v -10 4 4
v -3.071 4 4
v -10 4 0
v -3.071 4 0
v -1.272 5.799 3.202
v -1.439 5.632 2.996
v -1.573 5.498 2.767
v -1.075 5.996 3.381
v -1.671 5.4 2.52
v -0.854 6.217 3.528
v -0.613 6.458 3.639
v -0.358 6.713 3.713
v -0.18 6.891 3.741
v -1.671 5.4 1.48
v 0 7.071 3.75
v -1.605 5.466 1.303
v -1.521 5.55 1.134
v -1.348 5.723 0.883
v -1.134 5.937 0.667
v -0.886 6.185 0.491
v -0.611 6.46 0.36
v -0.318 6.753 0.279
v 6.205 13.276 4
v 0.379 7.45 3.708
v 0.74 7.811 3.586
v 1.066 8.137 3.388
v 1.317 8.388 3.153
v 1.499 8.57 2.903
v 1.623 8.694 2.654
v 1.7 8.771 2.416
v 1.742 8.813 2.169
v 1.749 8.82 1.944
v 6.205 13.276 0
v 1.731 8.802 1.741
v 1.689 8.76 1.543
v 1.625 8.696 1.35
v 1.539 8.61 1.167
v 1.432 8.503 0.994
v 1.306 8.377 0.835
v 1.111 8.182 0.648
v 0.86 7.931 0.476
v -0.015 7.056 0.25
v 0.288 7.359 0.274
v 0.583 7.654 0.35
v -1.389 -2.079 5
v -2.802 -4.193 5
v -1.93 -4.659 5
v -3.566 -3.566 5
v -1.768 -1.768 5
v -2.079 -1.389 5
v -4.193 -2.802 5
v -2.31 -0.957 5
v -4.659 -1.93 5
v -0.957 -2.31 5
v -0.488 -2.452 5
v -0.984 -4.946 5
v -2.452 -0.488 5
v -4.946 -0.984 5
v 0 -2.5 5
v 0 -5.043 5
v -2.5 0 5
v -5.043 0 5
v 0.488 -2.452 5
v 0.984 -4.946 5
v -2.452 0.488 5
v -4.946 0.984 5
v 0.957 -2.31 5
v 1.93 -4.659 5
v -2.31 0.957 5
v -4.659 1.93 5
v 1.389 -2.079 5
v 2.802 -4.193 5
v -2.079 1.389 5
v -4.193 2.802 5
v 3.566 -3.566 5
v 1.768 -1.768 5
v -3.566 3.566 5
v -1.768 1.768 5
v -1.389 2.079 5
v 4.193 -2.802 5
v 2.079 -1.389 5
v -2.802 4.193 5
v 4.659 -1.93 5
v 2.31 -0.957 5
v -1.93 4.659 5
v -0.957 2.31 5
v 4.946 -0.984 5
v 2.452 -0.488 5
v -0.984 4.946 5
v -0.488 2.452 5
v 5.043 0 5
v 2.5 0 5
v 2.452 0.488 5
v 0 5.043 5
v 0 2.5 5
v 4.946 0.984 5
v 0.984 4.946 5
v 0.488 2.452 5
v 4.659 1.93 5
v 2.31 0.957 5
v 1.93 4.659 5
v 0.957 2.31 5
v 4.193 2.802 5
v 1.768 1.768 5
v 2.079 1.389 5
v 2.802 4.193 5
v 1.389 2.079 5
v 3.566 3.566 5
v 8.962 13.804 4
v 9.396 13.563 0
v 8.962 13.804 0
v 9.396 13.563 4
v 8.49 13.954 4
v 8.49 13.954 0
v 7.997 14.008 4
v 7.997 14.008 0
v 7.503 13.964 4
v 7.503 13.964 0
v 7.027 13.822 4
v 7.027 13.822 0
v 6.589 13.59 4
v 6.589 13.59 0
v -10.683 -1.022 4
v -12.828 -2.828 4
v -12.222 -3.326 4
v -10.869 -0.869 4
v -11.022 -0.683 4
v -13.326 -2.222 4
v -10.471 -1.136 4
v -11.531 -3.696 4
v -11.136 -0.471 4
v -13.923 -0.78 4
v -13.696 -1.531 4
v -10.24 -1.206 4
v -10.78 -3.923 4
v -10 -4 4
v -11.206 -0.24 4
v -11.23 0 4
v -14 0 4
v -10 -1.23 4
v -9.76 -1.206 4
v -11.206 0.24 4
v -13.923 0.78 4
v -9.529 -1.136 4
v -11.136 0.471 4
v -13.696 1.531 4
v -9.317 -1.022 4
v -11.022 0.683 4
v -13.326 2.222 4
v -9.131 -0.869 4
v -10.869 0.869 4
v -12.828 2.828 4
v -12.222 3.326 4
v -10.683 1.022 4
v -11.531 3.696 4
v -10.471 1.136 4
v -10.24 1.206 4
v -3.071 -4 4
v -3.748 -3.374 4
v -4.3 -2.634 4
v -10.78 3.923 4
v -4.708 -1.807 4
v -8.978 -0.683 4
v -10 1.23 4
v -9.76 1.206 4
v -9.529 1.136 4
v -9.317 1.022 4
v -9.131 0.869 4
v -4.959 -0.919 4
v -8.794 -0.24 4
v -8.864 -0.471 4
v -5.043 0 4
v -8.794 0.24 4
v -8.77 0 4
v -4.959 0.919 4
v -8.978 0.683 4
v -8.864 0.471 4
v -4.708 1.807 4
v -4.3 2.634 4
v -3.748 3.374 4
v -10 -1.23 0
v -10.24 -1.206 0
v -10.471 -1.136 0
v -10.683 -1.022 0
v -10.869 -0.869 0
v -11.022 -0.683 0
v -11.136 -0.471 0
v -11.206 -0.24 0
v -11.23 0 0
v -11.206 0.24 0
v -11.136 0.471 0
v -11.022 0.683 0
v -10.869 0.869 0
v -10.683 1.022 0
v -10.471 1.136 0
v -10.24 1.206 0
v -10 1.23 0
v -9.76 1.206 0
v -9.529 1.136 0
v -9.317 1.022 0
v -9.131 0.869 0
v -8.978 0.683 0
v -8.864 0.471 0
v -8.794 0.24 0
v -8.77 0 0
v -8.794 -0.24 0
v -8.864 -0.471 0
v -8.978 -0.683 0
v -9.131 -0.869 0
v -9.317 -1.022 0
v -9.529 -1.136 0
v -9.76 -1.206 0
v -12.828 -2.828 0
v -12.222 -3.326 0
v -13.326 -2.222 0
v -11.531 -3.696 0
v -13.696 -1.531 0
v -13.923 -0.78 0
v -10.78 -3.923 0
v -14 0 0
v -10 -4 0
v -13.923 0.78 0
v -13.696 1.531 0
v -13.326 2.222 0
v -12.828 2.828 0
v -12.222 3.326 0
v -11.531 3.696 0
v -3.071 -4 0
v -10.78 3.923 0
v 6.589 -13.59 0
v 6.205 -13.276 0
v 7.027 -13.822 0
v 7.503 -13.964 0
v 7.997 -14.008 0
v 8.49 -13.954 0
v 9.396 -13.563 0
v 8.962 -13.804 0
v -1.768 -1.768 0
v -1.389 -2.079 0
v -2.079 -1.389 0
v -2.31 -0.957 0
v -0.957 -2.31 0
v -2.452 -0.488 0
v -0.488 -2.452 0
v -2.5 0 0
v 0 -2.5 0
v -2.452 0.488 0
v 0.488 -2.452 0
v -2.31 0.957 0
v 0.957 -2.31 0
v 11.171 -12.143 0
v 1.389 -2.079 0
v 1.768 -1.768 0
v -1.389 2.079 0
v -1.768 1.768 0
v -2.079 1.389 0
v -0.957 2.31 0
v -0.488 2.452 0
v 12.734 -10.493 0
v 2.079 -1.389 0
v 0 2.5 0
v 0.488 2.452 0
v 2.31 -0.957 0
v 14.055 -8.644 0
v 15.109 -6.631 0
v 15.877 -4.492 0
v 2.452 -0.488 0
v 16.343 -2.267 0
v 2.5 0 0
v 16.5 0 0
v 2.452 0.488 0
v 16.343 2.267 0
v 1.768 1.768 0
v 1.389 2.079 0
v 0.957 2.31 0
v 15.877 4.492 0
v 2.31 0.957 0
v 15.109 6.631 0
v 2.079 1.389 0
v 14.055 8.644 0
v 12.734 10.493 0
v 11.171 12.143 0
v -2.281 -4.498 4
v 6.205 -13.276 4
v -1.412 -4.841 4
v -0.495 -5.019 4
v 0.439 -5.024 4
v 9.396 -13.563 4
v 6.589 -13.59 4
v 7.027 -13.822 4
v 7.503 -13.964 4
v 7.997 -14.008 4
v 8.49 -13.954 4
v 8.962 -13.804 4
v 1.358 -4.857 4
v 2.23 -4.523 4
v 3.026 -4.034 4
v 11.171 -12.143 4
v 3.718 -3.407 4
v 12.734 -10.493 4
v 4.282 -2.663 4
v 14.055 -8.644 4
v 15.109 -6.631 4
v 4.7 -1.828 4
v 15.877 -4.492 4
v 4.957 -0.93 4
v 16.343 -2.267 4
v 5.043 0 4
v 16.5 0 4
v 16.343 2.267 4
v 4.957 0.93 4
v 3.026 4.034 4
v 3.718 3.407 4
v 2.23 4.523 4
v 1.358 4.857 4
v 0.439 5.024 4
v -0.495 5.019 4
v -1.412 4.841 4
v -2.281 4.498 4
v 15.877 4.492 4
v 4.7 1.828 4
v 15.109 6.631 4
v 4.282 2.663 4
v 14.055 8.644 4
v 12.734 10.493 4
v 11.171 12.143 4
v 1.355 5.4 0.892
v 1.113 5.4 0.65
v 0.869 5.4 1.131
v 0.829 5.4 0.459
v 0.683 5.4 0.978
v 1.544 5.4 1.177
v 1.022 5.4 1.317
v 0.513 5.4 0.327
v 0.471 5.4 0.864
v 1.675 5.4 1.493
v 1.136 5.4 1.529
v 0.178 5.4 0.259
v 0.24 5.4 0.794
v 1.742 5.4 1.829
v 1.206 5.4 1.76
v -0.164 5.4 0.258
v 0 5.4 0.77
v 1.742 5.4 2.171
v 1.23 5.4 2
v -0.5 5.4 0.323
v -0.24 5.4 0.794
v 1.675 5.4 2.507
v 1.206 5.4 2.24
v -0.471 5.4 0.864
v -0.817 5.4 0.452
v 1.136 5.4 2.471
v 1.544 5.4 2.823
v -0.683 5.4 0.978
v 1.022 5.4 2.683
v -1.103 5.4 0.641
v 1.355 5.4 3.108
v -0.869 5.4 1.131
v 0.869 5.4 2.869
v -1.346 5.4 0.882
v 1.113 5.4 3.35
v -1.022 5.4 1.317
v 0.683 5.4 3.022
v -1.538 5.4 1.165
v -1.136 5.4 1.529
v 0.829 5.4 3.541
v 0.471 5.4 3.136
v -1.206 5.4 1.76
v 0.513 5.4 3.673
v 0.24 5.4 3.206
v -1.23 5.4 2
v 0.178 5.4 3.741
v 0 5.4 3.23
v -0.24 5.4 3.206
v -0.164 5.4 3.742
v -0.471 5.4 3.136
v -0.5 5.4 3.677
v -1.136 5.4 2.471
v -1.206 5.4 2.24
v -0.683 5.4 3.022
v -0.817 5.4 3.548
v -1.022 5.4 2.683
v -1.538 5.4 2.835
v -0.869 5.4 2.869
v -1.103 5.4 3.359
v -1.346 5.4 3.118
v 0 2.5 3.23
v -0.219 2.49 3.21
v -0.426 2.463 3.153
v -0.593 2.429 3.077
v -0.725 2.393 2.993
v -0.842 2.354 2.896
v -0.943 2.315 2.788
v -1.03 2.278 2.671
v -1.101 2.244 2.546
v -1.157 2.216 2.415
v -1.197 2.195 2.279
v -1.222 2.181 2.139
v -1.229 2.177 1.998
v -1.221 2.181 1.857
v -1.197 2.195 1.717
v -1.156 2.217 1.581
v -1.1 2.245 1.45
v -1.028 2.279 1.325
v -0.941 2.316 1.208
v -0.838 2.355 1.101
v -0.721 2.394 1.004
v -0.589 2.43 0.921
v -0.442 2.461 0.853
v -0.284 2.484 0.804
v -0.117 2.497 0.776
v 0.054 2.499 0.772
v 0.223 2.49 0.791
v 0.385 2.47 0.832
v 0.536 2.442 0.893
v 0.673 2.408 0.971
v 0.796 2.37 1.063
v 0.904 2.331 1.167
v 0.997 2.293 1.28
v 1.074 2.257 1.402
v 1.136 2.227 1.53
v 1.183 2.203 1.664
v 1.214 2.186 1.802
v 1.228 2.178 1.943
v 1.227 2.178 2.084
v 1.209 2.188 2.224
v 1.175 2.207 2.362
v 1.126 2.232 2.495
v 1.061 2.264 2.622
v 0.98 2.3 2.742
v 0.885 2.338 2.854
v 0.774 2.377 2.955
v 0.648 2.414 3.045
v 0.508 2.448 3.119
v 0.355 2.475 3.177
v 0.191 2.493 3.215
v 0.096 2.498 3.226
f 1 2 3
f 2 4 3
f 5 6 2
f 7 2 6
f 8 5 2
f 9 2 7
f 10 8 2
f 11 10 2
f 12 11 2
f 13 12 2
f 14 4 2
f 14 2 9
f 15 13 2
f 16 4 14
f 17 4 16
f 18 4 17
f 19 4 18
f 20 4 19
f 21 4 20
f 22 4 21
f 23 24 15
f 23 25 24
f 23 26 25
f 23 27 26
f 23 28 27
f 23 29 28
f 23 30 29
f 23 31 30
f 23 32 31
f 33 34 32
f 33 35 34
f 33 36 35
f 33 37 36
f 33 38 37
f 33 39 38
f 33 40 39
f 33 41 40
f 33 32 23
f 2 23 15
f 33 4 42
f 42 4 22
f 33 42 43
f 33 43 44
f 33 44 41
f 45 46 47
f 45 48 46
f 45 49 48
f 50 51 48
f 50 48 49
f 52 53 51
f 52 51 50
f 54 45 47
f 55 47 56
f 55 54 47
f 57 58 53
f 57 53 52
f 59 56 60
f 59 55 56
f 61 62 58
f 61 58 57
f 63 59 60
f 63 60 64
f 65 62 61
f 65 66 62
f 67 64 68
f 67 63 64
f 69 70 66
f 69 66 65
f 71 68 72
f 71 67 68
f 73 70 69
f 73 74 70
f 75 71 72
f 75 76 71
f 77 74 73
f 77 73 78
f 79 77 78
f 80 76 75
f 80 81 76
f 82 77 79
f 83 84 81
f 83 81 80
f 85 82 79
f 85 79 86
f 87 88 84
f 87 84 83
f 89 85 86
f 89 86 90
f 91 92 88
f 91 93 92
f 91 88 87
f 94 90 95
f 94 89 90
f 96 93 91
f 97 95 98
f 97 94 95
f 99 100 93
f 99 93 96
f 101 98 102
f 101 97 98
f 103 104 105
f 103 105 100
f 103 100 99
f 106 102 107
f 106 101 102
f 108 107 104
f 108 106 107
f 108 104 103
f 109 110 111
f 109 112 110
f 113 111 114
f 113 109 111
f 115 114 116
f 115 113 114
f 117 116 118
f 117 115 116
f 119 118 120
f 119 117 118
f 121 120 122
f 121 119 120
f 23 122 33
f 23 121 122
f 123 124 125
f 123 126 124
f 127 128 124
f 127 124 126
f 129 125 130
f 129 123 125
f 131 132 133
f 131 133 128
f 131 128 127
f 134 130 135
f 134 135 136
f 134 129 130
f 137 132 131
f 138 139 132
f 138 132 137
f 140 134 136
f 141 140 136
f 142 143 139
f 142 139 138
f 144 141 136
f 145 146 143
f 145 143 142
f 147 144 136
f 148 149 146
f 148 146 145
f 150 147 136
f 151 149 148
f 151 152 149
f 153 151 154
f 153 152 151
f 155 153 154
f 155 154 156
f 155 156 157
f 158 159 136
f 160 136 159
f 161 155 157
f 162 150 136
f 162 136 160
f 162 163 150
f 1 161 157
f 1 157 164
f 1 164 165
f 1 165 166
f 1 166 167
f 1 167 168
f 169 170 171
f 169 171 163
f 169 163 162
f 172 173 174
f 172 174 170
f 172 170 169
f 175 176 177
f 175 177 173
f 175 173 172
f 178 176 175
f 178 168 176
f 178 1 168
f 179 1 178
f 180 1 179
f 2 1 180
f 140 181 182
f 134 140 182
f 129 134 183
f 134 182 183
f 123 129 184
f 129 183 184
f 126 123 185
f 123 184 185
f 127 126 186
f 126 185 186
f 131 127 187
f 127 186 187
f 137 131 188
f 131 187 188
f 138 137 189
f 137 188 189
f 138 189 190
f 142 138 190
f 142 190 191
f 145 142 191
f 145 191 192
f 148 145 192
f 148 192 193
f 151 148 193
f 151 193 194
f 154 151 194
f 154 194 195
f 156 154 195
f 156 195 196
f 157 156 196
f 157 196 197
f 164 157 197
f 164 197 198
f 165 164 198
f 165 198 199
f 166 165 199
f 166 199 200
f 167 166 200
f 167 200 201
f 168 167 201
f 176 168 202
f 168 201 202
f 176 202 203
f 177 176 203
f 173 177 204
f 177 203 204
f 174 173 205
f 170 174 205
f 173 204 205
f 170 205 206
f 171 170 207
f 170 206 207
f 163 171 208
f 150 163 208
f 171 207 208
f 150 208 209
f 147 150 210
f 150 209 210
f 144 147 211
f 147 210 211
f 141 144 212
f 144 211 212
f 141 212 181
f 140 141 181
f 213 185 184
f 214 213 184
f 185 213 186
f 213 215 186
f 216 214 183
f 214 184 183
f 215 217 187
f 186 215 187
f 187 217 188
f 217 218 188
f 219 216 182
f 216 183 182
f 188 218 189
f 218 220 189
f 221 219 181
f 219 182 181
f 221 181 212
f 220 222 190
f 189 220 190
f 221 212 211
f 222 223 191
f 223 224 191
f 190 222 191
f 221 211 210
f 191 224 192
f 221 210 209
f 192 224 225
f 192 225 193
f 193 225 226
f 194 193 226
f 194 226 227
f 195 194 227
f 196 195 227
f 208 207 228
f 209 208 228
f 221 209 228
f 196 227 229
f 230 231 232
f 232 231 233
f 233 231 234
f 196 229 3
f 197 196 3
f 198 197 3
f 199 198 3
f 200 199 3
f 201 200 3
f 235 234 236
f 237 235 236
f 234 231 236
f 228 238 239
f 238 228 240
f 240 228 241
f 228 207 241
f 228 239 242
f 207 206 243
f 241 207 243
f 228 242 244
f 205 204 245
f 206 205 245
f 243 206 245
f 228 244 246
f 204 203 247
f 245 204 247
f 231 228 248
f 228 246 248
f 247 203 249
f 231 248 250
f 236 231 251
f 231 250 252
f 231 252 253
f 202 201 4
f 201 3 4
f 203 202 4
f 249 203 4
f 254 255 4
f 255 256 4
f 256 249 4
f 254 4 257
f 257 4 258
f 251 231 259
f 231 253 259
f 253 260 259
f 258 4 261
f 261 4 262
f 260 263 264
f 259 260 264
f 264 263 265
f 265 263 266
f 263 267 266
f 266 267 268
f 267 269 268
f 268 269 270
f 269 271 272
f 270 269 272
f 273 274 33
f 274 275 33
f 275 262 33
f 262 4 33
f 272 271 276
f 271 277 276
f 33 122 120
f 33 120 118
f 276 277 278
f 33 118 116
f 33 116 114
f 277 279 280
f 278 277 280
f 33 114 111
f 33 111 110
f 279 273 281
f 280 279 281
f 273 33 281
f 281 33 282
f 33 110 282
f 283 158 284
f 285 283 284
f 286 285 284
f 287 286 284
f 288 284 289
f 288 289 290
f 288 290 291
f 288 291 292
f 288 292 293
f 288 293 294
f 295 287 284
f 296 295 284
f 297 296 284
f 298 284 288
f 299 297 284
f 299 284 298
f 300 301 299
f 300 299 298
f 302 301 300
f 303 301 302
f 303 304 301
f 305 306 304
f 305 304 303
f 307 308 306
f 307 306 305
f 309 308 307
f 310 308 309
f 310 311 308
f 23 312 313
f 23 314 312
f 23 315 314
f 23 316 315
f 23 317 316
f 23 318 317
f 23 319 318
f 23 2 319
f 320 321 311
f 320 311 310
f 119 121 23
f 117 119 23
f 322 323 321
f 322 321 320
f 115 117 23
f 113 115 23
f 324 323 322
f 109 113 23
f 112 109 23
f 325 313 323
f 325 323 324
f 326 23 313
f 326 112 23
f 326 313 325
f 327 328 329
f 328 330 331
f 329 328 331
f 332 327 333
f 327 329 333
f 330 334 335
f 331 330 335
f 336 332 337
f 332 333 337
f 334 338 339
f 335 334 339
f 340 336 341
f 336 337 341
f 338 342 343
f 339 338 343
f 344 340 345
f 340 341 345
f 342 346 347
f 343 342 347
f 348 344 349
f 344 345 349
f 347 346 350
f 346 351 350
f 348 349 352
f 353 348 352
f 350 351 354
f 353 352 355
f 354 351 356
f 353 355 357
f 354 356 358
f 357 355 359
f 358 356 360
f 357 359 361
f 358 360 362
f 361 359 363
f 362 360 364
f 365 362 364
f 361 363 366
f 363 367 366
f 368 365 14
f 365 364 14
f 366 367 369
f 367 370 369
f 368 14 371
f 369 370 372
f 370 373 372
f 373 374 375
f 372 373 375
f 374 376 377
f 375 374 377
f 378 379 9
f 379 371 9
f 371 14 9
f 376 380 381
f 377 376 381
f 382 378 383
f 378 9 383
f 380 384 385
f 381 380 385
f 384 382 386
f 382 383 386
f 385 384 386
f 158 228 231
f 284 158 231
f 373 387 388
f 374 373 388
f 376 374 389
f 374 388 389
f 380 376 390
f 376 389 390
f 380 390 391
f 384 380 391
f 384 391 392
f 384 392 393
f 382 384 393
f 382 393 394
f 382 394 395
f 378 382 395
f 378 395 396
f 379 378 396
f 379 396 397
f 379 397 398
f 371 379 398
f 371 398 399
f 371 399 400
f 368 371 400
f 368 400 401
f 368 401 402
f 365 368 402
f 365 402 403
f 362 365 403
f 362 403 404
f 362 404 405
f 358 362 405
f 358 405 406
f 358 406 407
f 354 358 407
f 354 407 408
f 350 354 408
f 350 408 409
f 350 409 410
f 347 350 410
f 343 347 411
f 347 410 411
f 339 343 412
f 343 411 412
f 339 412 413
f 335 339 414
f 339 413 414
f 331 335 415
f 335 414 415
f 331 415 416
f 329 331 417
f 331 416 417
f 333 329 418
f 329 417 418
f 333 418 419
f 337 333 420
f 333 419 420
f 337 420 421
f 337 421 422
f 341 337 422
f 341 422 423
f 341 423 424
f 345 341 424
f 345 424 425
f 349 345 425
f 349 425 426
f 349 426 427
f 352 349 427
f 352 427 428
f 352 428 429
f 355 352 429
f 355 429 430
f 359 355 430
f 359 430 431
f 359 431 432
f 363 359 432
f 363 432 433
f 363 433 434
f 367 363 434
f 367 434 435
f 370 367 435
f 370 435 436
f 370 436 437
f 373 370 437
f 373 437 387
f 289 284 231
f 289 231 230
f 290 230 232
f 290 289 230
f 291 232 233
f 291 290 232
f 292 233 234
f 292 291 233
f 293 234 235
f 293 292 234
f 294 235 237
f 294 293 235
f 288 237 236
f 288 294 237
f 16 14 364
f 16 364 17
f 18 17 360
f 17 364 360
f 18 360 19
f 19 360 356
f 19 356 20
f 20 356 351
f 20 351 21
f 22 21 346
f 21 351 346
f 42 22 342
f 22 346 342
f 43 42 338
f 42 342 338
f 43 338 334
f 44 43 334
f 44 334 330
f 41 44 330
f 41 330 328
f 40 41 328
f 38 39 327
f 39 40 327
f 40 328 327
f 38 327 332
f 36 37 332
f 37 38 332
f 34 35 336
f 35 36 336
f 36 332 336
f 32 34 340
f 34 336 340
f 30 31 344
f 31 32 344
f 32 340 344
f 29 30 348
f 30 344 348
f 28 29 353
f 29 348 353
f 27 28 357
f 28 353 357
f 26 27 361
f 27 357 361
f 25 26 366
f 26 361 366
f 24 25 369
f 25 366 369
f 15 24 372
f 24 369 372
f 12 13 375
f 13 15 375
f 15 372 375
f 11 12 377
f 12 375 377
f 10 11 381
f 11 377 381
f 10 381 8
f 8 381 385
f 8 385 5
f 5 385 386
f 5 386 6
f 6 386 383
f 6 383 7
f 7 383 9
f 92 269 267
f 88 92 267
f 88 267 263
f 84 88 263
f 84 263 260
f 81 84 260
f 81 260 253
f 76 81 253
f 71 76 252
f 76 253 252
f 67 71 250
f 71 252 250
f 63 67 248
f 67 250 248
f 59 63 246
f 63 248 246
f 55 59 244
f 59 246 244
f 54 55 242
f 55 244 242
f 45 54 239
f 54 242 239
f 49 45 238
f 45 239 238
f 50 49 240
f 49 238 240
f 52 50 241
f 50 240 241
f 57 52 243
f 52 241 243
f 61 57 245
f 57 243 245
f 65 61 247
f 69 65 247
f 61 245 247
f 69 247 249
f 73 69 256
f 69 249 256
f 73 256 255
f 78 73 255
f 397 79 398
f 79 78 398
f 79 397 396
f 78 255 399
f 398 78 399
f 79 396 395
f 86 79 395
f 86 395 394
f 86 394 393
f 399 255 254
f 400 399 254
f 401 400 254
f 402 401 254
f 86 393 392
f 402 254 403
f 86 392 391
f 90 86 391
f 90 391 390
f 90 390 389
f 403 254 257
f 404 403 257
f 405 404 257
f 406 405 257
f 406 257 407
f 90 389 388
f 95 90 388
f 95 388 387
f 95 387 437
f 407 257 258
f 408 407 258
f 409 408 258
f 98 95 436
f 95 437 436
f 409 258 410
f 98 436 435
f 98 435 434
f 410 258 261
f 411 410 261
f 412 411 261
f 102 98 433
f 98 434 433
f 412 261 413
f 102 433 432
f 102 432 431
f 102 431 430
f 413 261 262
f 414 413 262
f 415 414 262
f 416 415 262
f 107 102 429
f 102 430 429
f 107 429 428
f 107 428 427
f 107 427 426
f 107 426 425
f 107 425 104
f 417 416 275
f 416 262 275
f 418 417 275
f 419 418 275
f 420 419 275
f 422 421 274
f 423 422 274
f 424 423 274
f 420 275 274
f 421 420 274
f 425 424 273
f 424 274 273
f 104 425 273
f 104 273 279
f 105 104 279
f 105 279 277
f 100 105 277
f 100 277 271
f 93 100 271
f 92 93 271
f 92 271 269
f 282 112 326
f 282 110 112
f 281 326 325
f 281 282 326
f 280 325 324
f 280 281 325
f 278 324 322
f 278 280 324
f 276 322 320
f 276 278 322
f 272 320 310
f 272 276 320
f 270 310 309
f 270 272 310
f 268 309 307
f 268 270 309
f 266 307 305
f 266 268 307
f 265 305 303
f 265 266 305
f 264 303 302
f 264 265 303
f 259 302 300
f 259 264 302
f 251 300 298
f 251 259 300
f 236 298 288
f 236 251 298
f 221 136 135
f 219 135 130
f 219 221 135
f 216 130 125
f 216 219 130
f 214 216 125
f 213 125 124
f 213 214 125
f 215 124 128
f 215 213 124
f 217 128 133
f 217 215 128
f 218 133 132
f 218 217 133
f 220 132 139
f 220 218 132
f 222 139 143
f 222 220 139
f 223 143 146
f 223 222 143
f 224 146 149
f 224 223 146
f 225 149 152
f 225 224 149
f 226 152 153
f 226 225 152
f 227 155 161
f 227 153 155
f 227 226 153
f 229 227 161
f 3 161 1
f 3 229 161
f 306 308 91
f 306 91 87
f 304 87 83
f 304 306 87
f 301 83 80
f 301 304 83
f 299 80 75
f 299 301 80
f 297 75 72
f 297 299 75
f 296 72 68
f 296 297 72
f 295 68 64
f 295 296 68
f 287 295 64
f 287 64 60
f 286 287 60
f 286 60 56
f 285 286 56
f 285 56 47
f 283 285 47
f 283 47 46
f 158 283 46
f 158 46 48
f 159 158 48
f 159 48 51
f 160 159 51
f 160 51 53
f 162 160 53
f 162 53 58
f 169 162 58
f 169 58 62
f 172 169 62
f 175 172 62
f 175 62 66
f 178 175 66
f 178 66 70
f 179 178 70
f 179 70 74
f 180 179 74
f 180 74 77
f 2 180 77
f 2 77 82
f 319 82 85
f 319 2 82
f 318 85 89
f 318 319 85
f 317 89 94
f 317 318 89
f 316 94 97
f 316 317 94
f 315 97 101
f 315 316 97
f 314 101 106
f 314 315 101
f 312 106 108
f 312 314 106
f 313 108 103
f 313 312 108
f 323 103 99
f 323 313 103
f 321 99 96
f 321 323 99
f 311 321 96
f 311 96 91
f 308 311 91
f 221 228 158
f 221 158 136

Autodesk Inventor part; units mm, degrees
ref_plane "YZ Plane" through (0, 0, 0) normal (1, 0, 0) x (0, 1, 0)
ref_plane "XZ Plane" through (0, 0, 0) normal (0, 1, 0) x (-1, 0, 0)
sketch "Skizze1" plane through (0, 0, 0) normal (0, 0, 1) x (1, 0, 0)
  line L0 (0, -20.5159) -> (0, 20.5159) projected
  line L1 (-20.1, 0) -> (22.6, 0) projected
  circle A0 centre (0, 0) radius 2.5
  arc A1 (-3, 4) -> (-3, -4) centre (0, 0) ccw
  arc A2 (7.5831, -14.6542) -> (7.5831, 14.6542) centre (0, 0) ccw
  line L2 (-3.5355, 3.5355) -> (7.5831, 14.6542)
  line L3 (-3.5355, -3.5355) -> (7.5831, -14.6542)
  line L4 (-3, 4) -> (-10, 4)
  line L5 (-3, -4) -> (-10, -4)
  arc A3 (-10, 4) -> (-10, -4) centre (-10, 0) ccw
  dimension "d0" = 5
  dimension "d1" = 10
  dimension "d3" = 33
  dimension "d4" = 90
  dimension "d5" = 4
  dimension "d6" = 10
extrude "Extrusion1" add sketch "Skizze1" along normal blind 4 contours L3 L5 A1 L1 A0 L0 | L0 A0 L1 A2 L3 | L5 A3 L1 A1 L3 | L3 A1 L5 | L1 A1 L4 L2 L0 A0 | A0 L0 L2 A2 L1 | L1 A3 L4 L2 A1 | L2 L4 A1
fillet "Rundung1" radius 2.5 2 edges at (7.5831, 14.6542, 2) (7.5831, -14.6542, 2)
sketch "Skizze2" plane through (0, 0, 4) normal (0, 0, 1) x (1, 0, 0)
  arc A0 (-10, 4) -> (-10, -4) centre (-10, 0) ccw projected
  line L0 (0, -20.5159) -> (0, 20.5159) projected
  point P0 (0, 0)
hole "Bohrung1" at (-10, 0, 4) direction (0, 0, -1) diameter 2.459 end through all thread size "M3x0.5" class "6H" standard "ISO Metric profile"
sketch "Skizze3" plane through (0, 0, 4) normal (0, 0, 1) x (1, 0, 0)
  line L0 (0, -20.5159) -> (0, 20.5159) projected
  line L1 (-20.1, 0) -> (22.6, 0) projected
  line L2 (-10, -4) -> (-3.0711, -4) projected
  circle A0 centre (0, 0) radius 5.043
  circle A1 centre (0, 0) radius 2.5
  dimension "d17" = 5
extrude "Extrusion2" add sketch "Skizze3" along normal blind 1 contours A0 L1 A1 L0 | L0 A1 L1 A0 | L1 A1 L0 A0 | L1 A0 L0 A1
ref_plane "Arbeitsebene1" through (0, 10, 0) normal (0, 1, 0) x (-1, 0, 0)
sketch "Skizze7" plane through (0, 10, 0) normal (0, 1, 0) x (-1, 0, 0)
  line L0 (0, -0.8) -> (0, 4.8) projected
  line L1 (15, 0) -> (-2.5, 0) projected
  line L2 (10, 0) -> (10, 4) projected
  point P0 (0, 0)
  point P1 (0, 2)
  dimension "d30" = 2
hole "Bohrung3" at (0, 10, 2) direction (0, -1, 0) diameter 3.5 depth 4.6
sketch "Skizze8" plane through (0, 5.4, 2) normal (0, 1, 0) x (1, 0, 0)
  line L0 (0, 3) -> (0, -4) projected
  line L1 (22.6, 2) -> (-20.1, 2) projected
  point P0 (0, 2)
  point P1 (0, 0)
  dimension "d38" = 2
hole "Bohrung4" at (0, 5.4, 2) direction (0, -1, 0) diameter 2.459 end up to surface thread size "M3x0.5" class "6H" standard "ISO Metric profile"
properties part number "Kurbel 19"
